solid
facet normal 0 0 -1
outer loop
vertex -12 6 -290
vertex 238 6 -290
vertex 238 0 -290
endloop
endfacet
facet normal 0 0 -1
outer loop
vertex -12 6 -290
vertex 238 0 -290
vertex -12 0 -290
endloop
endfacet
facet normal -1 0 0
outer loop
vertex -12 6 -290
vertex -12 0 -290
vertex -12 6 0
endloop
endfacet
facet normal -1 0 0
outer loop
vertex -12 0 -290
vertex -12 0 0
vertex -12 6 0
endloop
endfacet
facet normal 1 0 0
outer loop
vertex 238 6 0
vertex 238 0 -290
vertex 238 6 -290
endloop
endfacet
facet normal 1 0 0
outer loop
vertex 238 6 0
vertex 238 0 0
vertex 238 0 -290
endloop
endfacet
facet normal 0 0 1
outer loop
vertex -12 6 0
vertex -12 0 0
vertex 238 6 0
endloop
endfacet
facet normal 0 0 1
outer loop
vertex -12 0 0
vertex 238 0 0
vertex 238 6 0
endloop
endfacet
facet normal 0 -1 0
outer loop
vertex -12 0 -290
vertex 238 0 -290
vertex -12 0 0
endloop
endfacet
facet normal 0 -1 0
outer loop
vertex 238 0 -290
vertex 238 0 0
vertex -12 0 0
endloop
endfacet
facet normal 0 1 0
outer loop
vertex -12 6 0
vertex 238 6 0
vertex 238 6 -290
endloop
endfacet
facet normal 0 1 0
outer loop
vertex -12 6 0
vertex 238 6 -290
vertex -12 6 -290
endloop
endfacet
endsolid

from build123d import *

# Parameters (mm, degrees)
ESBO_O1_W                = 238
ESBO_O1_H                = 250
RESSALTO_EXTRUS_O1_DEPTH = 6
ESBO_O2_W                = 250
ESBO_O2_H                = 6
RESSALTO_EXTRUS_O2_DEPTH = 12
ESBO_O3_W                = 250
ESBO_O3_H                = 6
RESSALTO_EXTRUS_O3_DEPTH = 40


with BuildPart() as part:
    # Esboço1 → Ressalto-extrusão1 (new body)
    with BuildSketch(Plane(origin=(0, 0, 0), x_dir=(1, 0, 0), z_dir=(0, 1, 0))):
        with Locations((119, 125)):
            Rectangle(ESBO_O1_W, ESBO_O1_H)
    extrude(amount=RESSALTO_EXTRUS_O1_DEPTH)

    # Esboço2 → Ressalto-extrusão2 (add)
    with BuildSketch(Plane.ZY):
        with Locations((-125, 3)):
            Rectangle(ESBO_O2_W, ESBO_O2_H)
    extrude(amount=RESSALTO_EXTRUS_O2_DEPTH)

    # Esboço3 → Ressalto-extrusão3 (add)
    with BuildSketch(Plane(origin=(0, 0, -250), x_dir=(-1, 0, 0), z_dir=(0, 0, -1))):
        with Locations((-113, 3)):
            Rectangle(ESBO_O3_W, ESBO_O3_H)
    extrude(amount=RESSALTO_EXTRUS_O3_DEPTH)


solid = part.part
